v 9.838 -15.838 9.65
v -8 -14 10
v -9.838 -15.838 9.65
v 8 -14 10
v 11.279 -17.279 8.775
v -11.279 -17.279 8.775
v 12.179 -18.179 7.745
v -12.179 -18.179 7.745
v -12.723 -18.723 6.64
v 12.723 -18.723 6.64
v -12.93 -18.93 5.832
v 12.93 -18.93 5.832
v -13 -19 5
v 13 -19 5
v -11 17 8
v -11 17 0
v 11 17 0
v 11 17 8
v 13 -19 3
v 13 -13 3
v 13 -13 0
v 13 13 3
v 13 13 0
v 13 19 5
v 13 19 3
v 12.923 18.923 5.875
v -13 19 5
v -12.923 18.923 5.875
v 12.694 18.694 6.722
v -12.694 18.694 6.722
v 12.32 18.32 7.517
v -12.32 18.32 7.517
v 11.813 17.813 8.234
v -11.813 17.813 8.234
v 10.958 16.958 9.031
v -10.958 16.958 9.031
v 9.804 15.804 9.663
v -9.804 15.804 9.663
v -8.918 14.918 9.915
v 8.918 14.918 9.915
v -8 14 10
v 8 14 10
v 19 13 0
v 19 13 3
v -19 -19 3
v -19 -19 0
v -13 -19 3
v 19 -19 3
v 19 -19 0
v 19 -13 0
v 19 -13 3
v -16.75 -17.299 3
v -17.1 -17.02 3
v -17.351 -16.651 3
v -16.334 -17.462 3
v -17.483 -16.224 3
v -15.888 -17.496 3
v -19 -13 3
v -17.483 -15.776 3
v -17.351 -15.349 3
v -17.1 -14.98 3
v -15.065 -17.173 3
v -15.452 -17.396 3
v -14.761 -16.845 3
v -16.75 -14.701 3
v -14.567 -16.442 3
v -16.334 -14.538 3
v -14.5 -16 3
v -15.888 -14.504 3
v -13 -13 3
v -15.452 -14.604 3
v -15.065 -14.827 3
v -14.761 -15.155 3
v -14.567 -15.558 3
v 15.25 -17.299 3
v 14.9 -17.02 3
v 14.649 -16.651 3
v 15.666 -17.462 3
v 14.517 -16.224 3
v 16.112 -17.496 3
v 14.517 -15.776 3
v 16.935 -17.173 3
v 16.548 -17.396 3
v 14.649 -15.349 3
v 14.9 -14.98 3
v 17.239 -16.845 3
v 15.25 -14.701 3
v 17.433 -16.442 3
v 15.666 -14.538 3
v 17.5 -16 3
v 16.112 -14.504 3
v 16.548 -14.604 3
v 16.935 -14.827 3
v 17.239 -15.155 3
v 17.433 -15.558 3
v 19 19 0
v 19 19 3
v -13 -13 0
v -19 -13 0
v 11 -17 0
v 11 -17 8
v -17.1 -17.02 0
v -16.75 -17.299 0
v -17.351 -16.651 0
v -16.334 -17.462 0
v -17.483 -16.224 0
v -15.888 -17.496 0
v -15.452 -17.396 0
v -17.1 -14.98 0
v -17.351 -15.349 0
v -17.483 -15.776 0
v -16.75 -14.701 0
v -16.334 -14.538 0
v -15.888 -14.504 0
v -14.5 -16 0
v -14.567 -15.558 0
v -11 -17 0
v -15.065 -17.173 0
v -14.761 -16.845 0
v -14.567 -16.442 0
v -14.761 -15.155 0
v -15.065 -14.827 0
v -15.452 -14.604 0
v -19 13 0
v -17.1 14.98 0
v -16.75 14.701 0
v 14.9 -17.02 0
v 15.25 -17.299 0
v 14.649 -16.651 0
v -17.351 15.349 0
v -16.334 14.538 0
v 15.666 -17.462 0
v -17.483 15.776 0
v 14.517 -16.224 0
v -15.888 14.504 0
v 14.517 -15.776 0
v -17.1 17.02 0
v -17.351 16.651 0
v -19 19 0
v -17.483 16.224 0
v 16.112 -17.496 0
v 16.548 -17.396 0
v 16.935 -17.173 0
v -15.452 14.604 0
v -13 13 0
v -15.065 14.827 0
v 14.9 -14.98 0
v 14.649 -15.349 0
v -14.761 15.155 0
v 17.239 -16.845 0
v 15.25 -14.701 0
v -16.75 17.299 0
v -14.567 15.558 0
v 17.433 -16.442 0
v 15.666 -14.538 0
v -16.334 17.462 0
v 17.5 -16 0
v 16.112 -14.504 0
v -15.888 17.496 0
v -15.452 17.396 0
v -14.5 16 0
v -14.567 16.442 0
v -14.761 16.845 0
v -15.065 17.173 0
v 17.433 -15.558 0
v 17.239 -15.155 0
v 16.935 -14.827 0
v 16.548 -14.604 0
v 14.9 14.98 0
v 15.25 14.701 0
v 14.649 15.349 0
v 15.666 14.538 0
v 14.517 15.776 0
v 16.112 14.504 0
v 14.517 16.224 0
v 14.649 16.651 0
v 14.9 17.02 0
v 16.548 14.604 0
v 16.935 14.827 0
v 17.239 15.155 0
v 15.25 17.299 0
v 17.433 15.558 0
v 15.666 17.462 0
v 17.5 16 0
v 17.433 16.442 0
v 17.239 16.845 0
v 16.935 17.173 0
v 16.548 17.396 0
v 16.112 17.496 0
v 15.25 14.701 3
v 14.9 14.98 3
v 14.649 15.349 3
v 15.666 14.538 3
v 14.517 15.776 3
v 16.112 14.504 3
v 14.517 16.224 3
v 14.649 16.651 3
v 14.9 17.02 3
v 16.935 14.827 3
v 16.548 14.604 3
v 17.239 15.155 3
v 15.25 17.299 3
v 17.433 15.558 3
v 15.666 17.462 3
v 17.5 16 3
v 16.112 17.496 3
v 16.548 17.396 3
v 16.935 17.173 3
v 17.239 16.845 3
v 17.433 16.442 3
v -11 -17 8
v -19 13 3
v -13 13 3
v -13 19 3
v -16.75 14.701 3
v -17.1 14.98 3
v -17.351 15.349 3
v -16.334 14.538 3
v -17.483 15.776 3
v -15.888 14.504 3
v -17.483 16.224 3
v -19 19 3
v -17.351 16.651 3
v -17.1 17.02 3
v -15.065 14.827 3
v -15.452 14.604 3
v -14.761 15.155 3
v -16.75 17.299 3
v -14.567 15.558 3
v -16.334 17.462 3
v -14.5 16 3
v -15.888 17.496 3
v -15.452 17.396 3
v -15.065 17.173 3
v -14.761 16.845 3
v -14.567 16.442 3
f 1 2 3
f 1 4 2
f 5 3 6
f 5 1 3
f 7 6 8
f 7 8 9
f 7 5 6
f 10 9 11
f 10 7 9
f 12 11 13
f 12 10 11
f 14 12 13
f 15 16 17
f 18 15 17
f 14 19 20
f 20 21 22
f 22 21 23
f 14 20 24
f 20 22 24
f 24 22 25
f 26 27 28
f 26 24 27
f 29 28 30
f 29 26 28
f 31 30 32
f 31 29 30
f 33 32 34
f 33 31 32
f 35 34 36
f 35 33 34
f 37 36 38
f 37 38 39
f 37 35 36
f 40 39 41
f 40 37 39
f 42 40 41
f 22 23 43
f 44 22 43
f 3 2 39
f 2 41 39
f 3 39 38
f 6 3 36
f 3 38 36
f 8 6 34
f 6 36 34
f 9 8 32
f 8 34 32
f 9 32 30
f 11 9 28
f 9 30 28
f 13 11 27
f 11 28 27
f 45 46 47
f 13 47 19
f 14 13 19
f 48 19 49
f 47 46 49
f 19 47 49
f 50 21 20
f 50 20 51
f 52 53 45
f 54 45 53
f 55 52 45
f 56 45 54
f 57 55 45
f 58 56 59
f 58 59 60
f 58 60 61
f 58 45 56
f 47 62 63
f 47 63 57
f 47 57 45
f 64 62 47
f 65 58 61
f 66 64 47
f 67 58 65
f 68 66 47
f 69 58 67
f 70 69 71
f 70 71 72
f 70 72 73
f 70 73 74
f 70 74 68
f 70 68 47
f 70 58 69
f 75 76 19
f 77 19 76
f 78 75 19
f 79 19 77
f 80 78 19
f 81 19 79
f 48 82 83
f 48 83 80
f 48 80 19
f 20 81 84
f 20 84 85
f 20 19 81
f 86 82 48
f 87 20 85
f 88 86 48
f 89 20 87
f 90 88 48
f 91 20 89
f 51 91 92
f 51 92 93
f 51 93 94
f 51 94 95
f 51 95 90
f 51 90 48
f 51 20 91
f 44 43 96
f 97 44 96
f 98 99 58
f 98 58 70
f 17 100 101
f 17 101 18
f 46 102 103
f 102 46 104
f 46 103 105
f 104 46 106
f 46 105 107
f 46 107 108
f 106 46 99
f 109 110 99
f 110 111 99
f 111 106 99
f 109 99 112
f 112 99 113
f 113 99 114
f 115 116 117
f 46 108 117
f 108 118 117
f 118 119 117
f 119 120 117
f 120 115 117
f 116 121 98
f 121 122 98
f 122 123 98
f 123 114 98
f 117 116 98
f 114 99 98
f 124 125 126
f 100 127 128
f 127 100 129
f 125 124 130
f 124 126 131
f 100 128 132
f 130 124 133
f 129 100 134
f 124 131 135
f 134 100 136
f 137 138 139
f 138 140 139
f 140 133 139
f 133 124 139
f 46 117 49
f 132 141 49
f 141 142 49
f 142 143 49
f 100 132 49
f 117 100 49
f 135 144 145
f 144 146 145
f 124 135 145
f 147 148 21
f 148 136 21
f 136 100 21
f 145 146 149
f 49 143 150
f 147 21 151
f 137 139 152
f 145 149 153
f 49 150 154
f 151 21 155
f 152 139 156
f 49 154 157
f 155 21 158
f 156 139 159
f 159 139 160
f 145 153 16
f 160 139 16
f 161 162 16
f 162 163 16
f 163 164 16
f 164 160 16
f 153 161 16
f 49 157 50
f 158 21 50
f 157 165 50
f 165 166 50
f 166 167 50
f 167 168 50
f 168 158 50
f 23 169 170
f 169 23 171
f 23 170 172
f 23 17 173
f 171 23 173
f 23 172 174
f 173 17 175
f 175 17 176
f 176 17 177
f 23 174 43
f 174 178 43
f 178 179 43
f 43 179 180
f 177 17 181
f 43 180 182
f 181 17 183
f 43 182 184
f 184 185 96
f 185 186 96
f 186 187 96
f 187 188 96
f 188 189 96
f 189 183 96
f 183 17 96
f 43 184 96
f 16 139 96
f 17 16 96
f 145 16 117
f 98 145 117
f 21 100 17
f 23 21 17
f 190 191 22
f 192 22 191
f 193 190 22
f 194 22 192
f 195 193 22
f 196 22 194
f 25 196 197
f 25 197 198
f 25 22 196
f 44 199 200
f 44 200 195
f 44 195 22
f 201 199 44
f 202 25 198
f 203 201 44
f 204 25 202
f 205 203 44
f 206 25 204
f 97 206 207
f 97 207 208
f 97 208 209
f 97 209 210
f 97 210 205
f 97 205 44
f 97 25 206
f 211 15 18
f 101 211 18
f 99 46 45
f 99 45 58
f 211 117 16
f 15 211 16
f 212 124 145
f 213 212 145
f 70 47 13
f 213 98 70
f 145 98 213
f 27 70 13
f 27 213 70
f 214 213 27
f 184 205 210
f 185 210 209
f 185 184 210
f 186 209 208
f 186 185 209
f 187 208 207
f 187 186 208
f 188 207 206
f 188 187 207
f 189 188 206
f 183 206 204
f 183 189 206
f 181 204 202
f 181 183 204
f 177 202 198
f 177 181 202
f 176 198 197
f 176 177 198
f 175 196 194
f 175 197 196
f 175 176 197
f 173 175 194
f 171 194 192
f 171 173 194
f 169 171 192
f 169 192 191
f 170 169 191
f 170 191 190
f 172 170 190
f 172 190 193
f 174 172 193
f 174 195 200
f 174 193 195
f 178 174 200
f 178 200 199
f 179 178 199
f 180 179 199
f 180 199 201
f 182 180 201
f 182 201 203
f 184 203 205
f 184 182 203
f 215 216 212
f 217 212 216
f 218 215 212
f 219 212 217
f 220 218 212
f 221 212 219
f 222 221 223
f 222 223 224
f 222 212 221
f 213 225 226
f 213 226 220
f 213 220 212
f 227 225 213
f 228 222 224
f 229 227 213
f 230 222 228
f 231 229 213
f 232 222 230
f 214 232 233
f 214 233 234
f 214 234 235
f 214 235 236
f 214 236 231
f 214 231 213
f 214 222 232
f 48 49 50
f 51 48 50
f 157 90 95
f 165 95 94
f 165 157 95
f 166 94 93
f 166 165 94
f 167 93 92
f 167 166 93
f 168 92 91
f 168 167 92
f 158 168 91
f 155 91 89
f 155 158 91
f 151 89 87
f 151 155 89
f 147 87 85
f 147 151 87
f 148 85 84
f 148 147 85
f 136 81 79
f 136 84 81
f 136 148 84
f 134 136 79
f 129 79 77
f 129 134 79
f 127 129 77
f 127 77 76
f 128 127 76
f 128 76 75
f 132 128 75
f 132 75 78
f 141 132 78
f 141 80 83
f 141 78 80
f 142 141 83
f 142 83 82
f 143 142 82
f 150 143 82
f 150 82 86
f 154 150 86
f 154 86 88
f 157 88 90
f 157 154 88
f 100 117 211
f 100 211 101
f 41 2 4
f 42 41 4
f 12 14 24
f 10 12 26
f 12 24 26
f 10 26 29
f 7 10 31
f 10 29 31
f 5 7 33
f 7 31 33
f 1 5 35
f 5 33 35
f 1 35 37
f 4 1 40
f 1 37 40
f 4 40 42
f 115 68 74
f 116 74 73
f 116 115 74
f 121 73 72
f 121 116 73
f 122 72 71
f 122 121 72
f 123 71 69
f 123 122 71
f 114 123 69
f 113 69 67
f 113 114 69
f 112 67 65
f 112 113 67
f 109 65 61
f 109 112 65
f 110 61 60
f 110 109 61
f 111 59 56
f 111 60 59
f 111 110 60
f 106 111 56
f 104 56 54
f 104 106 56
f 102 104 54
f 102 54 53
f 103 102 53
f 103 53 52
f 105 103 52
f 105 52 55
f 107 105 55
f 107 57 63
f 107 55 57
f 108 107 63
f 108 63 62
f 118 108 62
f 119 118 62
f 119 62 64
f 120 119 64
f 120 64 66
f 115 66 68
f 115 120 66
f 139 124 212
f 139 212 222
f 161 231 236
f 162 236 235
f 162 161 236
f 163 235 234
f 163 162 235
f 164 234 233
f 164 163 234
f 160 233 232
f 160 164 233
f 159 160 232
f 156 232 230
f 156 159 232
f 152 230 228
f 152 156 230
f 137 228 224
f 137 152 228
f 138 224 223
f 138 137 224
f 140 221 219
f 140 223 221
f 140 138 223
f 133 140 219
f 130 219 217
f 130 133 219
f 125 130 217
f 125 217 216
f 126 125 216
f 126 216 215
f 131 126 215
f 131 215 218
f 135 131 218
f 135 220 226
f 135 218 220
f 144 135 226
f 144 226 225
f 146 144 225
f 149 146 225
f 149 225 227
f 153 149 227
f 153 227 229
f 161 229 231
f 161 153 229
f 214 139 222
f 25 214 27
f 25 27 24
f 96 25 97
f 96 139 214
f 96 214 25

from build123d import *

# Parameters (mm, degrees)
SKETCH_1_W          = 26
SKETCH_1_H          = 38
EXTRUDE_1_DEPTH     = 10
SKETCH_2_W          = 22
SKETCH_2_H          = 34
CUT_EXTRUDE_1_DEPTH = 8
SKETCH_4_W          = 6
SKETCH_4_H          = 6
EXTRUDE_2_DEPTH     = 3
SKETCH_5_R          = 1.5
CUT_EXTRUDE_4_DEPTH = 11
FILLET_1_R          = 5


with BuildPart() as part:
    # ｽｹｯﾁ1 → ﾎﾞｽ - 押し出し1 (new body)
    with BuildSketch(Plane.XY):
        Rectangle(SKETCH_1_W, SKETCH_1_H)
    extrude(amount=EXTRUDE_1_DEPTH)

    # ｽｹｯﾁ2 → ｶｯﾄ - 押し出し1 (cut)
    with BuildSketch(Plane.XY):
        Rectangle(SKETCH_2_W, SKETCH_2_H)
    extrude(amount=CUT_EXTRUDE_1_DEPTH, mode=Mode.SUBTRACT)

    # ｽｹｯﾁ4 → ﾎﾞｽ - 押し出し2 (add)
    with BuildSketch(Plane.XY):
        with Locations((16, 16)):
            Rectangle(SKETCH_4_W, SKETCH_4_H)
        with Locations((16, -16)):
            Rectangle(SKETCH_4_W, SKETCH_4_H)
        with Locations((-16, -16)):
            Rectangle(SKETCH_4_W, SKETCH_4_H)
        with Locations((-16, 16)):
            Rectangle(SKETCH_4_W, SKETCH_4_H)
    extrude(amount=EXTRUDE_2_DEPTH)

    # ｽｹｯﾁ5 → ｶｯﾄ - 押し出し4 (cut, through all)
    with BuildSketch(Plane.XY):
        with Locations((-16, 16)):
            Circle(SKETCH_5_R)
        with Locations((-16, -16)):
            Circle(SKETCH_5_R)
        with Locations((16, -16)):
            Circle(SKETCH_5_R)
        with Locations((16, 16)):
            Circle(SKETCH_5_R)
    extrude(amount=CUT_EXTRUDE_4_DEPTH, mode=Mode.SUBTRACT)

    # ﾌｨﾚｯﾄ1
    fillet_1_edges = [part.edges().sort_by_distance(p)[0] for p in [
        (0, 19, 10),
        (0, -19, 10),
        (13, 0, 10),
        (-13, 0, 10),
    ]]
    fillet(fillet_1_edges, radius=FILLET_1_R)


solid = part.part
